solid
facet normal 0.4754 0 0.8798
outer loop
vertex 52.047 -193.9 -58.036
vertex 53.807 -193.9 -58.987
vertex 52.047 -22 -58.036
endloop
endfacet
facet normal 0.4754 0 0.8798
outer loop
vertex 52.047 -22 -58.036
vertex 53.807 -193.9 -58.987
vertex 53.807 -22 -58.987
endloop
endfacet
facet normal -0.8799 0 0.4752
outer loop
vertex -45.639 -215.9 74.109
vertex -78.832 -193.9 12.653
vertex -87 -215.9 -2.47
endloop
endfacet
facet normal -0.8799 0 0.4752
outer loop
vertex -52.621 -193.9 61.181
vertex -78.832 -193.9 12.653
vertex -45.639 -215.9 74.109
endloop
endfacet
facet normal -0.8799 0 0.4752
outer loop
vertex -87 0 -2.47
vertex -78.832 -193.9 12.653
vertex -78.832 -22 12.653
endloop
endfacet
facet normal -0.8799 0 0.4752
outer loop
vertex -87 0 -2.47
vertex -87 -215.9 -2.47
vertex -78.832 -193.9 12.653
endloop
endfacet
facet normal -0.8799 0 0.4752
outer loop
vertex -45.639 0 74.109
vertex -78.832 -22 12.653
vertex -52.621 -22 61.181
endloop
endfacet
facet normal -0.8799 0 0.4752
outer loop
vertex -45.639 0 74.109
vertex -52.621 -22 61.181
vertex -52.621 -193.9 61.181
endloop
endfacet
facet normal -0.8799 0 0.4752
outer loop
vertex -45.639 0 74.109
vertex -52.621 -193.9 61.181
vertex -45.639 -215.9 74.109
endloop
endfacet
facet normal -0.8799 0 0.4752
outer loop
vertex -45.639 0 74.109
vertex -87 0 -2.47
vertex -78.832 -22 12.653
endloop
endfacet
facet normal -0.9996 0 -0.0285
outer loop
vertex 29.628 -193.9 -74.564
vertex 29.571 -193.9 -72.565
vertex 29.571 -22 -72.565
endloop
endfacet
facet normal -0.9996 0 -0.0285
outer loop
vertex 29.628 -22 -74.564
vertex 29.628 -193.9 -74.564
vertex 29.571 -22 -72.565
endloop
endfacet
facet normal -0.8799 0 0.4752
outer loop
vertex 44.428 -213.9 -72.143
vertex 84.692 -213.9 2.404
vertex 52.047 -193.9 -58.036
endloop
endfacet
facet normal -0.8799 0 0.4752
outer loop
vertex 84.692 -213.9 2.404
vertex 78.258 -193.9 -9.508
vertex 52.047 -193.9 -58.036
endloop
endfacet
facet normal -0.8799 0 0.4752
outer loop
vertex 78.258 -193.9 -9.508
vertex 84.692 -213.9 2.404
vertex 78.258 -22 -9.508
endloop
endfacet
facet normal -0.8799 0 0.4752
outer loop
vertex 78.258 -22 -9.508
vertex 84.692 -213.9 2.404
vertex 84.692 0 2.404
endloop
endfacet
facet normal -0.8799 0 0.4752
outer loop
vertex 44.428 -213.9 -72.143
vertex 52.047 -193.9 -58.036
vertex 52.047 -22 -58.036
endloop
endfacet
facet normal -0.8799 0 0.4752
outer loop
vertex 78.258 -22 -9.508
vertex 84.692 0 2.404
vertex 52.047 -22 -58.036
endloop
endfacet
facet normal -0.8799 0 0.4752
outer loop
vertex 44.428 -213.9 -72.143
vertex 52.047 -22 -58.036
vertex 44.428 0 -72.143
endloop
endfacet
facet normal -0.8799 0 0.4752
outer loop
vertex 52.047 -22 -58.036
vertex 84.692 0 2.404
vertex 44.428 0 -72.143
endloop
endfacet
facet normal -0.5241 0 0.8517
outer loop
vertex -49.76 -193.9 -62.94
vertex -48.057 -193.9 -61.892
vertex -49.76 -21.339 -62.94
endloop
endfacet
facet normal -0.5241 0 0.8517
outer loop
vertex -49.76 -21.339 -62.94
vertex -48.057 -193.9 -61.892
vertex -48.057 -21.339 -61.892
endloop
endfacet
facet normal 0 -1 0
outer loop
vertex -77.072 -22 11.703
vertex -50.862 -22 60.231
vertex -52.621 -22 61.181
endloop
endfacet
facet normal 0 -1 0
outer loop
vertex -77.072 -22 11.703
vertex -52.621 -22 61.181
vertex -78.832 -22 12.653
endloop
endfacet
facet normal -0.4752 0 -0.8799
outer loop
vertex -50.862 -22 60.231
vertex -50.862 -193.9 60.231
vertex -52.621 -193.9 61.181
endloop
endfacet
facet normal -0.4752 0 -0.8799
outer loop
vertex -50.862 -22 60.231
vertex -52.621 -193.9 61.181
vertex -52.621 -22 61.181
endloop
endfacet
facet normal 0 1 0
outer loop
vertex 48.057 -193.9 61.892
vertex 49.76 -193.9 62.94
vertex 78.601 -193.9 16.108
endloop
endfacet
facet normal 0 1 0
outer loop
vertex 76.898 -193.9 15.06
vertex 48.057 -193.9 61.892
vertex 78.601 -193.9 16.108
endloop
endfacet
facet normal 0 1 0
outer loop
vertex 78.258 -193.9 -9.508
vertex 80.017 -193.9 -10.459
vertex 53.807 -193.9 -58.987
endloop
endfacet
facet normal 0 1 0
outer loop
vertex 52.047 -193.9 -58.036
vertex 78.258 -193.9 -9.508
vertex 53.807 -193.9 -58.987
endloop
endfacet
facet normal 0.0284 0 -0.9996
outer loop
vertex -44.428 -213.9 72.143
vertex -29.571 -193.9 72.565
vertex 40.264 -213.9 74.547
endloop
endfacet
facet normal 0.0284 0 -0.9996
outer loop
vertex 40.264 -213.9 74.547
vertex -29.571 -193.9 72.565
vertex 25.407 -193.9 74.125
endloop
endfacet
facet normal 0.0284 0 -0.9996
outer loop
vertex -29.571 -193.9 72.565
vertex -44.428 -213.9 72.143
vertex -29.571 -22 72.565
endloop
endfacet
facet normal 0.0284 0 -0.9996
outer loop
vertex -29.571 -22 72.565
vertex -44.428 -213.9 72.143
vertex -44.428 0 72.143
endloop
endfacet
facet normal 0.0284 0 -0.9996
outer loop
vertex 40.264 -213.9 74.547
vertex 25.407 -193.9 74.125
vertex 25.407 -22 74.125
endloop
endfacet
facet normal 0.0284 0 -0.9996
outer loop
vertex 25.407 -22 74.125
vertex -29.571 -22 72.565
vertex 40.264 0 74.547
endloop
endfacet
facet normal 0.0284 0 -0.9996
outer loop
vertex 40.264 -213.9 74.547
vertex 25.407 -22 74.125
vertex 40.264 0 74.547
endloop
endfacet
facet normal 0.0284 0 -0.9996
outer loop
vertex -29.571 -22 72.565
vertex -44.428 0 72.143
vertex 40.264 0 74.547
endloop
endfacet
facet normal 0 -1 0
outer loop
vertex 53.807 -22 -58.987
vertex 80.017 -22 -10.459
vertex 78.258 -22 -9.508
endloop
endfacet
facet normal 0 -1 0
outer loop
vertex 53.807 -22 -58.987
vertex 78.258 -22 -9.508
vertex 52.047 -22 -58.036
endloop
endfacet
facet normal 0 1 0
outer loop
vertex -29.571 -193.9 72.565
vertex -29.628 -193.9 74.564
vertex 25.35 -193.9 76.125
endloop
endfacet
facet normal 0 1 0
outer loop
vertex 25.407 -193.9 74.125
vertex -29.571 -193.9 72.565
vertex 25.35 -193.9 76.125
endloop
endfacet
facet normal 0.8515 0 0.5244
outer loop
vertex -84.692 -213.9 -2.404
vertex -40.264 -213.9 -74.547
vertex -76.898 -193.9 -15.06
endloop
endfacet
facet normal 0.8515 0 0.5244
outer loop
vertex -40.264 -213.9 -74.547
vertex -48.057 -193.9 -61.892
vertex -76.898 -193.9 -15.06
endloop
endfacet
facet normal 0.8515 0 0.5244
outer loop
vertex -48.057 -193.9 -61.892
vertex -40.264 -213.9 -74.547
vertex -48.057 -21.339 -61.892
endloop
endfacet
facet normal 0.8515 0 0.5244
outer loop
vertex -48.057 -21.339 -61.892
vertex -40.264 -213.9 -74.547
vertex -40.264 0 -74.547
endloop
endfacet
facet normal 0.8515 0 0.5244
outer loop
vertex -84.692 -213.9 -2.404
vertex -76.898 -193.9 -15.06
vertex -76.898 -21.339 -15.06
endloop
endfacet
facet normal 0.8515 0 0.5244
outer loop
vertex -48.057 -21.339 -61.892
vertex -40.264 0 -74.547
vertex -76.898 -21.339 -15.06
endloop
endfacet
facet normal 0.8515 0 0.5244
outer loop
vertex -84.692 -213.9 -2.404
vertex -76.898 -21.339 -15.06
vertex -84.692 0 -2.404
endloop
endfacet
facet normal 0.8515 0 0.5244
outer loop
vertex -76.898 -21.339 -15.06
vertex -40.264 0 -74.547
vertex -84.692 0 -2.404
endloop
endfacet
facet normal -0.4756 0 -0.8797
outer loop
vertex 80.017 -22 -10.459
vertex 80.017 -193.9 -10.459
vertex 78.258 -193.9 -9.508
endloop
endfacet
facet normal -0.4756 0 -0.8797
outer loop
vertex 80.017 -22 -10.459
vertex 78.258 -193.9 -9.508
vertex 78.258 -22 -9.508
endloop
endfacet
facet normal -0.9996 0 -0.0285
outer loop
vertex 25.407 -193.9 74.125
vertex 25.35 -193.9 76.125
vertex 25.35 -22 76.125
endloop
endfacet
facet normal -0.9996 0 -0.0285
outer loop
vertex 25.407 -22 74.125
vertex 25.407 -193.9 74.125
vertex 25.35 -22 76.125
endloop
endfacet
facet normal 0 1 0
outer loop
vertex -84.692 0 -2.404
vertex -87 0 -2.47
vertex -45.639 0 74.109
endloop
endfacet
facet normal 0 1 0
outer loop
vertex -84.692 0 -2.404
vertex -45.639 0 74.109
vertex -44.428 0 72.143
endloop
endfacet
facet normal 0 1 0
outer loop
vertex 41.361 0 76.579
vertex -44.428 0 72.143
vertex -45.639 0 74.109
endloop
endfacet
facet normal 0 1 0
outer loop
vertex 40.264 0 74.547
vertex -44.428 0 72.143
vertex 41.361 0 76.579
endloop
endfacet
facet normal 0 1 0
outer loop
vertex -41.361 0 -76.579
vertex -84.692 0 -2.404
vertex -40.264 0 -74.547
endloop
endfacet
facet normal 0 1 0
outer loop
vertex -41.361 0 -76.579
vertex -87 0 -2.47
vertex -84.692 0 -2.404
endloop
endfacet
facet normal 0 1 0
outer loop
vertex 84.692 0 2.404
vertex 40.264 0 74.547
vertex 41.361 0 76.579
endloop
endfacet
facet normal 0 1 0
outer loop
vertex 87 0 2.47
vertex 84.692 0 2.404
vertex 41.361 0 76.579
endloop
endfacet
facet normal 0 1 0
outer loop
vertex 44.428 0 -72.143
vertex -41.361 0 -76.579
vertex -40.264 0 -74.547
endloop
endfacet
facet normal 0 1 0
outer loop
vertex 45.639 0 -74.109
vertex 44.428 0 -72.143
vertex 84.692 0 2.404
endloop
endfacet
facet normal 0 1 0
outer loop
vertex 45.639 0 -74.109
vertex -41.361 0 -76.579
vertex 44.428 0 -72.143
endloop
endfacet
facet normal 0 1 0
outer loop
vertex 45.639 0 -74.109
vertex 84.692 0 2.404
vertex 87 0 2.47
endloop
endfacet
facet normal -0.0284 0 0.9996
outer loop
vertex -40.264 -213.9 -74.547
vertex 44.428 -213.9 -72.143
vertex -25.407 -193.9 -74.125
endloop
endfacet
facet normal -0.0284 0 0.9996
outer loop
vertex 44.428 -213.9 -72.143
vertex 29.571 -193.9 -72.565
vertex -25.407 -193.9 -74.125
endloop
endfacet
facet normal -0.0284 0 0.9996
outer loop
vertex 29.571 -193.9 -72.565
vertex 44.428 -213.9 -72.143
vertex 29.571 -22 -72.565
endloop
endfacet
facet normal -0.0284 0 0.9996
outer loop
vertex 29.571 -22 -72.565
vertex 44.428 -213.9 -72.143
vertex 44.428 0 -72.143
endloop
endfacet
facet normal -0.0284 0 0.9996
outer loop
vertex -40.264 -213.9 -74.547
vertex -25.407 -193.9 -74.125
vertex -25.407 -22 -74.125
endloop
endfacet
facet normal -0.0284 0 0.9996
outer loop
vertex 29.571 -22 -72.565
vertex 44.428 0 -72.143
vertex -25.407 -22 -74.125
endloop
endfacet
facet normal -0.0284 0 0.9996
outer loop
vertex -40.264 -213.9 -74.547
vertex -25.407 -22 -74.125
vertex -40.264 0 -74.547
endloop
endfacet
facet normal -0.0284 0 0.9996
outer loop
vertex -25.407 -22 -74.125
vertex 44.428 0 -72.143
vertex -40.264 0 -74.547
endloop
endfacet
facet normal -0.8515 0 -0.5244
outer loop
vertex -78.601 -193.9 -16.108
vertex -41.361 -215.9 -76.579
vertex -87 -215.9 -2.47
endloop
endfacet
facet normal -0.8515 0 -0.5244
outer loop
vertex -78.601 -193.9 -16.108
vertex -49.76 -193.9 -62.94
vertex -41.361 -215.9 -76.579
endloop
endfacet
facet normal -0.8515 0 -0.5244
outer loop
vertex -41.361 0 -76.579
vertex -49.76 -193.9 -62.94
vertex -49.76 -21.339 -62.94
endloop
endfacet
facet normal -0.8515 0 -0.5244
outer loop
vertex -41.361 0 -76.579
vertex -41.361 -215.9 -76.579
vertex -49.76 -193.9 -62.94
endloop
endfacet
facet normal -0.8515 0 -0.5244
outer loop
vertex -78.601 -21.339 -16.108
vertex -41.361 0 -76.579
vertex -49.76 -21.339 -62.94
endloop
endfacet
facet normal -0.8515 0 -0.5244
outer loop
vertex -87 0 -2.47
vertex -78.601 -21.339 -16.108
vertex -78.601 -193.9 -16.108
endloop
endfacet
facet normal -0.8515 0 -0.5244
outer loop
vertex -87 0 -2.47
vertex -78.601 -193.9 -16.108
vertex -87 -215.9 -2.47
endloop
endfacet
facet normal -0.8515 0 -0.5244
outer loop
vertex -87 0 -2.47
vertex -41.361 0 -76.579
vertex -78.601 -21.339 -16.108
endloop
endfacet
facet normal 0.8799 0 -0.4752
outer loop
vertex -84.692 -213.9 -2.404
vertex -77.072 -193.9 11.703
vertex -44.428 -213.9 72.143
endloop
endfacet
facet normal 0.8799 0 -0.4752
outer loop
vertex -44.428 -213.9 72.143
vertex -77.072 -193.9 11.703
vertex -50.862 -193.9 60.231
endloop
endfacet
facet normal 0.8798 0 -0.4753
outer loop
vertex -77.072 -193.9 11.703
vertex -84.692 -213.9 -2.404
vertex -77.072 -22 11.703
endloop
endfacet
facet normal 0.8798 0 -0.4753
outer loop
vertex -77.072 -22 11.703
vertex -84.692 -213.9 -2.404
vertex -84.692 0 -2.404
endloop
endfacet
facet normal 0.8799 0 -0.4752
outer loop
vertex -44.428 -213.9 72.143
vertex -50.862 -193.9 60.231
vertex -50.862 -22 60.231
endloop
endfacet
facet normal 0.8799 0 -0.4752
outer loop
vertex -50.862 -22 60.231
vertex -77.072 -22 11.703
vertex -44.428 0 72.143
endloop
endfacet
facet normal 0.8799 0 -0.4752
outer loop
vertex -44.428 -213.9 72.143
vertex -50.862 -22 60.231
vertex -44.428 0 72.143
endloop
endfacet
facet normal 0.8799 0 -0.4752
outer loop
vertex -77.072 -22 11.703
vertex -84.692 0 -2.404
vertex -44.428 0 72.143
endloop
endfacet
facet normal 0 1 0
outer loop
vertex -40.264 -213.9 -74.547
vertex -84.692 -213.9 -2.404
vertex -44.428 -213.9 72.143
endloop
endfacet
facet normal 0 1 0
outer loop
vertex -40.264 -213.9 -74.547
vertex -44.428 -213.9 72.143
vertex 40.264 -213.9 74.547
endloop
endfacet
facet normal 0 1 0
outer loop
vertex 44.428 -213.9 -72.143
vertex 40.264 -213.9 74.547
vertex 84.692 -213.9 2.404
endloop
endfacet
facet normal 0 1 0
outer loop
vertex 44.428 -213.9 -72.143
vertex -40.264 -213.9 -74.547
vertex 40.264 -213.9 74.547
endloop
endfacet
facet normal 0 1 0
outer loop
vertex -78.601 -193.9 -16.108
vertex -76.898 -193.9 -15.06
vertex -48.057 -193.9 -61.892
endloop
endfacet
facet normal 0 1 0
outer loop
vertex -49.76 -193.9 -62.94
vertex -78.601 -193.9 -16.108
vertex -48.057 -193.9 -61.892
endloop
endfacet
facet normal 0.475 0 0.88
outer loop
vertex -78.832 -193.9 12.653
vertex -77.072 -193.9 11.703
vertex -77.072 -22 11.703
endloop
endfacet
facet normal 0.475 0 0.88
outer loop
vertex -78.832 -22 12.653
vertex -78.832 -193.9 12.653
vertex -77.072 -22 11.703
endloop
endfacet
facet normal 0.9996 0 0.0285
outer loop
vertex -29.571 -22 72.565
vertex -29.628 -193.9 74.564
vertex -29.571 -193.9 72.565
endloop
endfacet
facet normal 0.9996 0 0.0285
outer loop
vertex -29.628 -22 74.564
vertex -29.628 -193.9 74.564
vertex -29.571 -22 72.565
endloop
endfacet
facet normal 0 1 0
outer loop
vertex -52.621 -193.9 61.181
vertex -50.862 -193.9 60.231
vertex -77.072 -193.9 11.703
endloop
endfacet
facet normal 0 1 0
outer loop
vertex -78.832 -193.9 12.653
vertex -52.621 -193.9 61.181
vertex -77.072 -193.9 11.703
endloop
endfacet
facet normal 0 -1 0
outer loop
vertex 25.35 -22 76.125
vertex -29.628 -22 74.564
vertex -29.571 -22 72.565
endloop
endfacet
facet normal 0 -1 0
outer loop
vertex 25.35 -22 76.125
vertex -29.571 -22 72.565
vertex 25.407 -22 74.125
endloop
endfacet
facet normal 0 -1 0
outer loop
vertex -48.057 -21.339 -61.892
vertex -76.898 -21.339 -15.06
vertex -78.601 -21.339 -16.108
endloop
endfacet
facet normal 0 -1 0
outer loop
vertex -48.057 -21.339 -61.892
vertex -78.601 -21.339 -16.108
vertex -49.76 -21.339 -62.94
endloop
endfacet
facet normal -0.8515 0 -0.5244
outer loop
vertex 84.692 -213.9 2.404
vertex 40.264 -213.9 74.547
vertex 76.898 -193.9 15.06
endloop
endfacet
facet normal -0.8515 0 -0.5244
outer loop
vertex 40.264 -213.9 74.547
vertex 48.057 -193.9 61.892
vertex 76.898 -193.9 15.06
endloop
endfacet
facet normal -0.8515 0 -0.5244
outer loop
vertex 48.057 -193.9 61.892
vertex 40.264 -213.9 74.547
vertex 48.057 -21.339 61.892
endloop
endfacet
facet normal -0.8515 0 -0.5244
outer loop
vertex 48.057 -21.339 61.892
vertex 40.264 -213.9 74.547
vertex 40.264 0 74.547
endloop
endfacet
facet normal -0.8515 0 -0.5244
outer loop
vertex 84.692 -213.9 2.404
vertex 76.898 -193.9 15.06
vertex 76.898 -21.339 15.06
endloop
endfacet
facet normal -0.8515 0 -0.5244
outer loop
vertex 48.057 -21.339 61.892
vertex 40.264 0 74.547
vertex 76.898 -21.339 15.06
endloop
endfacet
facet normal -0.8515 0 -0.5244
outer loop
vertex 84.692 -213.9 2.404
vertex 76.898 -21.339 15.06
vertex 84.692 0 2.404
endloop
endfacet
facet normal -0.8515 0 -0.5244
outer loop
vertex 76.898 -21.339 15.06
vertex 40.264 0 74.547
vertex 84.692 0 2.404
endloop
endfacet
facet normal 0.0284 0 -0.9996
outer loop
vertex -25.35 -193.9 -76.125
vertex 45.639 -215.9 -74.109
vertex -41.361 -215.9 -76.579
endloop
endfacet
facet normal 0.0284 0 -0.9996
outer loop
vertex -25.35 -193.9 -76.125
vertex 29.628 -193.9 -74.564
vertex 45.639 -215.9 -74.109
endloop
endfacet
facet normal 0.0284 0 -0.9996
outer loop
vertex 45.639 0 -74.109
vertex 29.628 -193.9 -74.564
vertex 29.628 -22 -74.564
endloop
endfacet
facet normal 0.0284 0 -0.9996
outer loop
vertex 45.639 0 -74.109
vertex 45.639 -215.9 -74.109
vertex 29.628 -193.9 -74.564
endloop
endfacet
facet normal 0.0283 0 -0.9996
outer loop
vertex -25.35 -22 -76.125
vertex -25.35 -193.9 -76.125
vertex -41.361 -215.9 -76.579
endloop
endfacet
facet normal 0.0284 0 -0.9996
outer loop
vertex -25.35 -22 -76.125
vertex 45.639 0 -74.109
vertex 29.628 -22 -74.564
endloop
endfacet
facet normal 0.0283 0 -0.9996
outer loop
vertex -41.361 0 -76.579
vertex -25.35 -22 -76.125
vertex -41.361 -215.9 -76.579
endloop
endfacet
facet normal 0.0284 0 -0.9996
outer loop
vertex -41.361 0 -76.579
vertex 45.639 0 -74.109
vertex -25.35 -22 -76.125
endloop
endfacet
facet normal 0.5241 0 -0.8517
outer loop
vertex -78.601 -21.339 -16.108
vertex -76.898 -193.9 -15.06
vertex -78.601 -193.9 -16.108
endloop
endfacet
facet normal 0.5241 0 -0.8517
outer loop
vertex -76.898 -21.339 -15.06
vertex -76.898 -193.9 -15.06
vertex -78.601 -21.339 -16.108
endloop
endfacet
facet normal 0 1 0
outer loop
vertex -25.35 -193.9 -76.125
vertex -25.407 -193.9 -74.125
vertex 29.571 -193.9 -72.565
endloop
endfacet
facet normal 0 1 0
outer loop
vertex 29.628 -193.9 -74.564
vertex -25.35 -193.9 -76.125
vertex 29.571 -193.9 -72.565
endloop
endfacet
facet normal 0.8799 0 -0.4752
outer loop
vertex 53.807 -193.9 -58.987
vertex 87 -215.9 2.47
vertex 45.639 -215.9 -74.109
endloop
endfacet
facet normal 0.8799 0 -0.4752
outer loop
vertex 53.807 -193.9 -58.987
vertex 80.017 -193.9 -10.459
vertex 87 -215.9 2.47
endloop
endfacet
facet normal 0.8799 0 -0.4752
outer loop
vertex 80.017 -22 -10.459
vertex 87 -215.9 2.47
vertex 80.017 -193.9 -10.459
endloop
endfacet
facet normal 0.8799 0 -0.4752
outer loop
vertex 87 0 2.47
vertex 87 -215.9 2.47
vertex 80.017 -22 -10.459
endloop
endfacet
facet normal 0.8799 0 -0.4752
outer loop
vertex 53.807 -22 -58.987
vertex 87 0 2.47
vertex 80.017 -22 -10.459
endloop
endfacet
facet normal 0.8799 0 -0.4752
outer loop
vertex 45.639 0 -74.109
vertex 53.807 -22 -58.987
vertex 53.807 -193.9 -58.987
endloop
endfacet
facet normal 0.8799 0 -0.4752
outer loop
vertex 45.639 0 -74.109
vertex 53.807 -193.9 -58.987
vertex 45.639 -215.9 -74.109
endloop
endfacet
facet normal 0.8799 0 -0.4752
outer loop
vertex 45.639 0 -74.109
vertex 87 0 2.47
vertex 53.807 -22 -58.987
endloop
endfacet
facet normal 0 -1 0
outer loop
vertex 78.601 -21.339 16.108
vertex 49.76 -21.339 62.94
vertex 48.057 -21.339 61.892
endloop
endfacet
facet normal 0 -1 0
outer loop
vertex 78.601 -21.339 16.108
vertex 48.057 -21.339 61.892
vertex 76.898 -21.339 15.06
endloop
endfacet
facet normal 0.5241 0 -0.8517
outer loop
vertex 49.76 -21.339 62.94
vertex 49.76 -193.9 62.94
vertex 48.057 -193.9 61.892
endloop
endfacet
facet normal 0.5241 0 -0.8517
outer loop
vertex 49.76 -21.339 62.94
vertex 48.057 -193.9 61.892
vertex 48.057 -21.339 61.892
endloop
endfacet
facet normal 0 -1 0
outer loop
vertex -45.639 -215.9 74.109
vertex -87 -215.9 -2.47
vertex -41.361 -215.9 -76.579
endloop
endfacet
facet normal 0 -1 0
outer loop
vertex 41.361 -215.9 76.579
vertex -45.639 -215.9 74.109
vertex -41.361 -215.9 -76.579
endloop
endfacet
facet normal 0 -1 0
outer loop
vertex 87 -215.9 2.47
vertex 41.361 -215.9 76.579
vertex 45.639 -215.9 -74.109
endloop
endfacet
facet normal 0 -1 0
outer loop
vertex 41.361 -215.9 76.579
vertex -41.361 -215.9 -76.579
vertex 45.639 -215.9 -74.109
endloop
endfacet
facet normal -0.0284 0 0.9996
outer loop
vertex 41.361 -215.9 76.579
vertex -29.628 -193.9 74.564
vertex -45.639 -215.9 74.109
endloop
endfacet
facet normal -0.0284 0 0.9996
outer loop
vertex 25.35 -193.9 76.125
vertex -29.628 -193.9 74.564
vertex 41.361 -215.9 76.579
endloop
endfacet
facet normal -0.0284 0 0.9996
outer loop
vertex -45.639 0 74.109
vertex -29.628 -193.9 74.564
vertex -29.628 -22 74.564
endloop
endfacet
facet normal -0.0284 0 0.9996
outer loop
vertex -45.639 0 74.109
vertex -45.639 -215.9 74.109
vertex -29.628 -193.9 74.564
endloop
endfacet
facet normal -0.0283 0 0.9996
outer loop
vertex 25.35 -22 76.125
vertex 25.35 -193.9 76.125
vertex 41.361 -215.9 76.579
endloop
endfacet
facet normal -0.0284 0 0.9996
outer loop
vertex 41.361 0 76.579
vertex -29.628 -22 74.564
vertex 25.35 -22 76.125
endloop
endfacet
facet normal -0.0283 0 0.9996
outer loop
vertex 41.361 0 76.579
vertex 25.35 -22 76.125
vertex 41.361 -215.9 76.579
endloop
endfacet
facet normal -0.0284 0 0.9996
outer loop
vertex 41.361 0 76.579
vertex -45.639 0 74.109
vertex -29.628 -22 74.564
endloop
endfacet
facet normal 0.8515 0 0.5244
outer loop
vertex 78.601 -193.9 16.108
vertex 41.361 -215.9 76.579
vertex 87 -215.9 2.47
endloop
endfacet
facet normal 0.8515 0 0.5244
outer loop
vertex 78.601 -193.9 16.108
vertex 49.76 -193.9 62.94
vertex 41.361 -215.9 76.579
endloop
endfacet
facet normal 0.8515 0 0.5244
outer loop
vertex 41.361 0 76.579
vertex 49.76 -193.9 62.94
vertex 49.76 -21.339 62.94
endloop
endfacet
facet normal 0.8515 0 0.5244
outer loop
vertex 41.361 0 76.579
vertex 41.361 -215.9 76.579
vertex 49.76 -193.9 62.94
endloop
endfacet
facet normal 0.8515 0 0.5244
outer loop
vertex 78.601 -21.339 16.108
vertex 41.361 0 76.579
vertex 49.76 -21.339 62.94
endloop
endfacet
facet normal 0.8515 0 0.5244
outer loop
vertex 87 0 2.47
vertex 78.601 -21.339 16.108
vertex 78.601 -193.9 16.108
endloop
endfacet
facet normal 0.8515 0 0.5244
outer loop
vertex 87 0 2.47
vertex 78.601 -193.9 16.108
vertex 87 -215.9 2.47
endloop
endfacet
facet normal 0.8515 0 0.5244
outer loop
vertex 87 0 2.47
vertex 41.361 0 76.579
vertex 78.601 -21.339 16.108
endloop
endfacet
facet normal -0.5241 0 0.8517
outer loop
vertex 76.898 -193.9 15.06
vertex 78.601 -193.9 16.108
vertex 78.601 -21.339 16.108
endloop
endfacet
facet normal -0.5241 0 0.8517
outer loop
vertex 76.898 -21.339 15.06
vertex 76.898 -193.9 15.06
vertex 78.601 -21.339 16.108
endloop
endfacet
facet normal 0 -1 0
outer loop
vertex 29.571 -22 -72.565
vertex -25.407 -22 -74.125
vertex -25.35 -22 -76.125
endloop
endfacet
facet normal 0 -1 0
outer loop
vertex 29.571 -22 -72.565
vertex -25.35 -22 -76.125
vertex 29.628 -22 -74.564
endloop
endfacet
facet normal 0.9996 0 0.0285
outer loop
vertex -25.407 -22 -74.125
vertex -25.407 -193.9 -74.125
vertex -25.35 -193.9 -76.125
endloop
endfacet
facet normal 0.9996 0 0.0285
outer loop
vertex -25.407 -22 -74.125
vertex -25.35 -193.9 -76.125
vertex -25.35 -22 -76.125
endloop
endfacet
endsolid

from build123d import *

# Parameters (mm, degrees)
SALIENTE_EXTRUIR1_DEPTH = 215.9
VACIADO2_T              = -2
CROQUIS2_W              = 55
CROQUIS2_H              = 171.9
CORTAR_EXTRUIR1_DEPTH   = 215.9
CROQUIS3_W              = 55
CROQUIS3_H              = 172.561085537
CORTAR_EXTRUIR2_DEPTH   = 215.9
CROQUIS4_W              = 55.15393927
CROQUIS4_H              = 171.9
CORTAR_EXTRUIR3_DEPTH   = 215.9


with BuildPart() as part:
    # Croquis1 → Saliente-Extruir1 (new body)
    with BuildSketch(Plane(origin=(0, 0, 0), x_dir=(1, 0, 0), z_dir=(0, 1, 0))):
        Polygon((-87, 2.4695933), (-45.638730535, -74.109413479), (41.361269465, -76.579006779), (87, -2.4695933), (45.638730535, 74.109413479), (-41.361269465, 76.579006779), align=None)
    extrude(amount=-SALIENTE_EXTRUIR1_DEPTH)

    # Vaciado2
    vaciado2_openings = [part.faces().sort_by_distance(p)[0] for p in [
        (0, 0, 0),
    ]]
    offset(amount=VACIADO2_T, openings=vaciado2_openings, kind=Kind.INTERSECTION)

    # Croquis2 → Cortar-Extruir1 (cut)
    with BuildSketch(Plane(origin=(-2.138730535, 0, 75.344210129), x_dir=(0.9995973571275039, 0, 0.02837470041620955), z_dir=(-0.02837470041620955, 0, 0.9995973571275039))):
        with Locations((0, -107.95)):
            Rectangle(CROQUIS2_W, CROQUIS2_H)
    extrude(amount=-CORTAR_EXTRUIR1_DEPTH, mode=Mode.SUBTRACT)

    # Croquis3 → Cortar-Extruir2 (cut)
    with BuildSketch(Plane(origin=(64.180634732, 0, 39.52430004), x_dir=(0.5243718899489567, 0, -0.8514893546201029), z_dir=(0.8514893546201029, 0, 0.5243718899489567))):
        with Locations((0, -107.619457232)):
            Rectangle(CROQUIS3_W, CROQUIS3_H)
    extrude(amount=-CORTAR_EXTRUIR2_DEPTH, mode=Mode.SUBTRACT)

    # Croquis4 → Cortar-Extruir3 (cut)
    with BuildSketch(Plane(origin=(66.319365268, 0, -35.819910089), x_dir=(-0.47522546717854747, 0, -0.8798640550363058), z_dir=(0.8798640550363059, 0, -0.4752254671785475))):
        with Locations((-1.247199632, -107.95)):
            Rectangle(CROQUIS4_W, CROQUIS4_H)
    extrude(amount=-CORTAR_EXTRUIR3_DEPTH, mode=Mode.SUBTRACT)


solid = part.part
